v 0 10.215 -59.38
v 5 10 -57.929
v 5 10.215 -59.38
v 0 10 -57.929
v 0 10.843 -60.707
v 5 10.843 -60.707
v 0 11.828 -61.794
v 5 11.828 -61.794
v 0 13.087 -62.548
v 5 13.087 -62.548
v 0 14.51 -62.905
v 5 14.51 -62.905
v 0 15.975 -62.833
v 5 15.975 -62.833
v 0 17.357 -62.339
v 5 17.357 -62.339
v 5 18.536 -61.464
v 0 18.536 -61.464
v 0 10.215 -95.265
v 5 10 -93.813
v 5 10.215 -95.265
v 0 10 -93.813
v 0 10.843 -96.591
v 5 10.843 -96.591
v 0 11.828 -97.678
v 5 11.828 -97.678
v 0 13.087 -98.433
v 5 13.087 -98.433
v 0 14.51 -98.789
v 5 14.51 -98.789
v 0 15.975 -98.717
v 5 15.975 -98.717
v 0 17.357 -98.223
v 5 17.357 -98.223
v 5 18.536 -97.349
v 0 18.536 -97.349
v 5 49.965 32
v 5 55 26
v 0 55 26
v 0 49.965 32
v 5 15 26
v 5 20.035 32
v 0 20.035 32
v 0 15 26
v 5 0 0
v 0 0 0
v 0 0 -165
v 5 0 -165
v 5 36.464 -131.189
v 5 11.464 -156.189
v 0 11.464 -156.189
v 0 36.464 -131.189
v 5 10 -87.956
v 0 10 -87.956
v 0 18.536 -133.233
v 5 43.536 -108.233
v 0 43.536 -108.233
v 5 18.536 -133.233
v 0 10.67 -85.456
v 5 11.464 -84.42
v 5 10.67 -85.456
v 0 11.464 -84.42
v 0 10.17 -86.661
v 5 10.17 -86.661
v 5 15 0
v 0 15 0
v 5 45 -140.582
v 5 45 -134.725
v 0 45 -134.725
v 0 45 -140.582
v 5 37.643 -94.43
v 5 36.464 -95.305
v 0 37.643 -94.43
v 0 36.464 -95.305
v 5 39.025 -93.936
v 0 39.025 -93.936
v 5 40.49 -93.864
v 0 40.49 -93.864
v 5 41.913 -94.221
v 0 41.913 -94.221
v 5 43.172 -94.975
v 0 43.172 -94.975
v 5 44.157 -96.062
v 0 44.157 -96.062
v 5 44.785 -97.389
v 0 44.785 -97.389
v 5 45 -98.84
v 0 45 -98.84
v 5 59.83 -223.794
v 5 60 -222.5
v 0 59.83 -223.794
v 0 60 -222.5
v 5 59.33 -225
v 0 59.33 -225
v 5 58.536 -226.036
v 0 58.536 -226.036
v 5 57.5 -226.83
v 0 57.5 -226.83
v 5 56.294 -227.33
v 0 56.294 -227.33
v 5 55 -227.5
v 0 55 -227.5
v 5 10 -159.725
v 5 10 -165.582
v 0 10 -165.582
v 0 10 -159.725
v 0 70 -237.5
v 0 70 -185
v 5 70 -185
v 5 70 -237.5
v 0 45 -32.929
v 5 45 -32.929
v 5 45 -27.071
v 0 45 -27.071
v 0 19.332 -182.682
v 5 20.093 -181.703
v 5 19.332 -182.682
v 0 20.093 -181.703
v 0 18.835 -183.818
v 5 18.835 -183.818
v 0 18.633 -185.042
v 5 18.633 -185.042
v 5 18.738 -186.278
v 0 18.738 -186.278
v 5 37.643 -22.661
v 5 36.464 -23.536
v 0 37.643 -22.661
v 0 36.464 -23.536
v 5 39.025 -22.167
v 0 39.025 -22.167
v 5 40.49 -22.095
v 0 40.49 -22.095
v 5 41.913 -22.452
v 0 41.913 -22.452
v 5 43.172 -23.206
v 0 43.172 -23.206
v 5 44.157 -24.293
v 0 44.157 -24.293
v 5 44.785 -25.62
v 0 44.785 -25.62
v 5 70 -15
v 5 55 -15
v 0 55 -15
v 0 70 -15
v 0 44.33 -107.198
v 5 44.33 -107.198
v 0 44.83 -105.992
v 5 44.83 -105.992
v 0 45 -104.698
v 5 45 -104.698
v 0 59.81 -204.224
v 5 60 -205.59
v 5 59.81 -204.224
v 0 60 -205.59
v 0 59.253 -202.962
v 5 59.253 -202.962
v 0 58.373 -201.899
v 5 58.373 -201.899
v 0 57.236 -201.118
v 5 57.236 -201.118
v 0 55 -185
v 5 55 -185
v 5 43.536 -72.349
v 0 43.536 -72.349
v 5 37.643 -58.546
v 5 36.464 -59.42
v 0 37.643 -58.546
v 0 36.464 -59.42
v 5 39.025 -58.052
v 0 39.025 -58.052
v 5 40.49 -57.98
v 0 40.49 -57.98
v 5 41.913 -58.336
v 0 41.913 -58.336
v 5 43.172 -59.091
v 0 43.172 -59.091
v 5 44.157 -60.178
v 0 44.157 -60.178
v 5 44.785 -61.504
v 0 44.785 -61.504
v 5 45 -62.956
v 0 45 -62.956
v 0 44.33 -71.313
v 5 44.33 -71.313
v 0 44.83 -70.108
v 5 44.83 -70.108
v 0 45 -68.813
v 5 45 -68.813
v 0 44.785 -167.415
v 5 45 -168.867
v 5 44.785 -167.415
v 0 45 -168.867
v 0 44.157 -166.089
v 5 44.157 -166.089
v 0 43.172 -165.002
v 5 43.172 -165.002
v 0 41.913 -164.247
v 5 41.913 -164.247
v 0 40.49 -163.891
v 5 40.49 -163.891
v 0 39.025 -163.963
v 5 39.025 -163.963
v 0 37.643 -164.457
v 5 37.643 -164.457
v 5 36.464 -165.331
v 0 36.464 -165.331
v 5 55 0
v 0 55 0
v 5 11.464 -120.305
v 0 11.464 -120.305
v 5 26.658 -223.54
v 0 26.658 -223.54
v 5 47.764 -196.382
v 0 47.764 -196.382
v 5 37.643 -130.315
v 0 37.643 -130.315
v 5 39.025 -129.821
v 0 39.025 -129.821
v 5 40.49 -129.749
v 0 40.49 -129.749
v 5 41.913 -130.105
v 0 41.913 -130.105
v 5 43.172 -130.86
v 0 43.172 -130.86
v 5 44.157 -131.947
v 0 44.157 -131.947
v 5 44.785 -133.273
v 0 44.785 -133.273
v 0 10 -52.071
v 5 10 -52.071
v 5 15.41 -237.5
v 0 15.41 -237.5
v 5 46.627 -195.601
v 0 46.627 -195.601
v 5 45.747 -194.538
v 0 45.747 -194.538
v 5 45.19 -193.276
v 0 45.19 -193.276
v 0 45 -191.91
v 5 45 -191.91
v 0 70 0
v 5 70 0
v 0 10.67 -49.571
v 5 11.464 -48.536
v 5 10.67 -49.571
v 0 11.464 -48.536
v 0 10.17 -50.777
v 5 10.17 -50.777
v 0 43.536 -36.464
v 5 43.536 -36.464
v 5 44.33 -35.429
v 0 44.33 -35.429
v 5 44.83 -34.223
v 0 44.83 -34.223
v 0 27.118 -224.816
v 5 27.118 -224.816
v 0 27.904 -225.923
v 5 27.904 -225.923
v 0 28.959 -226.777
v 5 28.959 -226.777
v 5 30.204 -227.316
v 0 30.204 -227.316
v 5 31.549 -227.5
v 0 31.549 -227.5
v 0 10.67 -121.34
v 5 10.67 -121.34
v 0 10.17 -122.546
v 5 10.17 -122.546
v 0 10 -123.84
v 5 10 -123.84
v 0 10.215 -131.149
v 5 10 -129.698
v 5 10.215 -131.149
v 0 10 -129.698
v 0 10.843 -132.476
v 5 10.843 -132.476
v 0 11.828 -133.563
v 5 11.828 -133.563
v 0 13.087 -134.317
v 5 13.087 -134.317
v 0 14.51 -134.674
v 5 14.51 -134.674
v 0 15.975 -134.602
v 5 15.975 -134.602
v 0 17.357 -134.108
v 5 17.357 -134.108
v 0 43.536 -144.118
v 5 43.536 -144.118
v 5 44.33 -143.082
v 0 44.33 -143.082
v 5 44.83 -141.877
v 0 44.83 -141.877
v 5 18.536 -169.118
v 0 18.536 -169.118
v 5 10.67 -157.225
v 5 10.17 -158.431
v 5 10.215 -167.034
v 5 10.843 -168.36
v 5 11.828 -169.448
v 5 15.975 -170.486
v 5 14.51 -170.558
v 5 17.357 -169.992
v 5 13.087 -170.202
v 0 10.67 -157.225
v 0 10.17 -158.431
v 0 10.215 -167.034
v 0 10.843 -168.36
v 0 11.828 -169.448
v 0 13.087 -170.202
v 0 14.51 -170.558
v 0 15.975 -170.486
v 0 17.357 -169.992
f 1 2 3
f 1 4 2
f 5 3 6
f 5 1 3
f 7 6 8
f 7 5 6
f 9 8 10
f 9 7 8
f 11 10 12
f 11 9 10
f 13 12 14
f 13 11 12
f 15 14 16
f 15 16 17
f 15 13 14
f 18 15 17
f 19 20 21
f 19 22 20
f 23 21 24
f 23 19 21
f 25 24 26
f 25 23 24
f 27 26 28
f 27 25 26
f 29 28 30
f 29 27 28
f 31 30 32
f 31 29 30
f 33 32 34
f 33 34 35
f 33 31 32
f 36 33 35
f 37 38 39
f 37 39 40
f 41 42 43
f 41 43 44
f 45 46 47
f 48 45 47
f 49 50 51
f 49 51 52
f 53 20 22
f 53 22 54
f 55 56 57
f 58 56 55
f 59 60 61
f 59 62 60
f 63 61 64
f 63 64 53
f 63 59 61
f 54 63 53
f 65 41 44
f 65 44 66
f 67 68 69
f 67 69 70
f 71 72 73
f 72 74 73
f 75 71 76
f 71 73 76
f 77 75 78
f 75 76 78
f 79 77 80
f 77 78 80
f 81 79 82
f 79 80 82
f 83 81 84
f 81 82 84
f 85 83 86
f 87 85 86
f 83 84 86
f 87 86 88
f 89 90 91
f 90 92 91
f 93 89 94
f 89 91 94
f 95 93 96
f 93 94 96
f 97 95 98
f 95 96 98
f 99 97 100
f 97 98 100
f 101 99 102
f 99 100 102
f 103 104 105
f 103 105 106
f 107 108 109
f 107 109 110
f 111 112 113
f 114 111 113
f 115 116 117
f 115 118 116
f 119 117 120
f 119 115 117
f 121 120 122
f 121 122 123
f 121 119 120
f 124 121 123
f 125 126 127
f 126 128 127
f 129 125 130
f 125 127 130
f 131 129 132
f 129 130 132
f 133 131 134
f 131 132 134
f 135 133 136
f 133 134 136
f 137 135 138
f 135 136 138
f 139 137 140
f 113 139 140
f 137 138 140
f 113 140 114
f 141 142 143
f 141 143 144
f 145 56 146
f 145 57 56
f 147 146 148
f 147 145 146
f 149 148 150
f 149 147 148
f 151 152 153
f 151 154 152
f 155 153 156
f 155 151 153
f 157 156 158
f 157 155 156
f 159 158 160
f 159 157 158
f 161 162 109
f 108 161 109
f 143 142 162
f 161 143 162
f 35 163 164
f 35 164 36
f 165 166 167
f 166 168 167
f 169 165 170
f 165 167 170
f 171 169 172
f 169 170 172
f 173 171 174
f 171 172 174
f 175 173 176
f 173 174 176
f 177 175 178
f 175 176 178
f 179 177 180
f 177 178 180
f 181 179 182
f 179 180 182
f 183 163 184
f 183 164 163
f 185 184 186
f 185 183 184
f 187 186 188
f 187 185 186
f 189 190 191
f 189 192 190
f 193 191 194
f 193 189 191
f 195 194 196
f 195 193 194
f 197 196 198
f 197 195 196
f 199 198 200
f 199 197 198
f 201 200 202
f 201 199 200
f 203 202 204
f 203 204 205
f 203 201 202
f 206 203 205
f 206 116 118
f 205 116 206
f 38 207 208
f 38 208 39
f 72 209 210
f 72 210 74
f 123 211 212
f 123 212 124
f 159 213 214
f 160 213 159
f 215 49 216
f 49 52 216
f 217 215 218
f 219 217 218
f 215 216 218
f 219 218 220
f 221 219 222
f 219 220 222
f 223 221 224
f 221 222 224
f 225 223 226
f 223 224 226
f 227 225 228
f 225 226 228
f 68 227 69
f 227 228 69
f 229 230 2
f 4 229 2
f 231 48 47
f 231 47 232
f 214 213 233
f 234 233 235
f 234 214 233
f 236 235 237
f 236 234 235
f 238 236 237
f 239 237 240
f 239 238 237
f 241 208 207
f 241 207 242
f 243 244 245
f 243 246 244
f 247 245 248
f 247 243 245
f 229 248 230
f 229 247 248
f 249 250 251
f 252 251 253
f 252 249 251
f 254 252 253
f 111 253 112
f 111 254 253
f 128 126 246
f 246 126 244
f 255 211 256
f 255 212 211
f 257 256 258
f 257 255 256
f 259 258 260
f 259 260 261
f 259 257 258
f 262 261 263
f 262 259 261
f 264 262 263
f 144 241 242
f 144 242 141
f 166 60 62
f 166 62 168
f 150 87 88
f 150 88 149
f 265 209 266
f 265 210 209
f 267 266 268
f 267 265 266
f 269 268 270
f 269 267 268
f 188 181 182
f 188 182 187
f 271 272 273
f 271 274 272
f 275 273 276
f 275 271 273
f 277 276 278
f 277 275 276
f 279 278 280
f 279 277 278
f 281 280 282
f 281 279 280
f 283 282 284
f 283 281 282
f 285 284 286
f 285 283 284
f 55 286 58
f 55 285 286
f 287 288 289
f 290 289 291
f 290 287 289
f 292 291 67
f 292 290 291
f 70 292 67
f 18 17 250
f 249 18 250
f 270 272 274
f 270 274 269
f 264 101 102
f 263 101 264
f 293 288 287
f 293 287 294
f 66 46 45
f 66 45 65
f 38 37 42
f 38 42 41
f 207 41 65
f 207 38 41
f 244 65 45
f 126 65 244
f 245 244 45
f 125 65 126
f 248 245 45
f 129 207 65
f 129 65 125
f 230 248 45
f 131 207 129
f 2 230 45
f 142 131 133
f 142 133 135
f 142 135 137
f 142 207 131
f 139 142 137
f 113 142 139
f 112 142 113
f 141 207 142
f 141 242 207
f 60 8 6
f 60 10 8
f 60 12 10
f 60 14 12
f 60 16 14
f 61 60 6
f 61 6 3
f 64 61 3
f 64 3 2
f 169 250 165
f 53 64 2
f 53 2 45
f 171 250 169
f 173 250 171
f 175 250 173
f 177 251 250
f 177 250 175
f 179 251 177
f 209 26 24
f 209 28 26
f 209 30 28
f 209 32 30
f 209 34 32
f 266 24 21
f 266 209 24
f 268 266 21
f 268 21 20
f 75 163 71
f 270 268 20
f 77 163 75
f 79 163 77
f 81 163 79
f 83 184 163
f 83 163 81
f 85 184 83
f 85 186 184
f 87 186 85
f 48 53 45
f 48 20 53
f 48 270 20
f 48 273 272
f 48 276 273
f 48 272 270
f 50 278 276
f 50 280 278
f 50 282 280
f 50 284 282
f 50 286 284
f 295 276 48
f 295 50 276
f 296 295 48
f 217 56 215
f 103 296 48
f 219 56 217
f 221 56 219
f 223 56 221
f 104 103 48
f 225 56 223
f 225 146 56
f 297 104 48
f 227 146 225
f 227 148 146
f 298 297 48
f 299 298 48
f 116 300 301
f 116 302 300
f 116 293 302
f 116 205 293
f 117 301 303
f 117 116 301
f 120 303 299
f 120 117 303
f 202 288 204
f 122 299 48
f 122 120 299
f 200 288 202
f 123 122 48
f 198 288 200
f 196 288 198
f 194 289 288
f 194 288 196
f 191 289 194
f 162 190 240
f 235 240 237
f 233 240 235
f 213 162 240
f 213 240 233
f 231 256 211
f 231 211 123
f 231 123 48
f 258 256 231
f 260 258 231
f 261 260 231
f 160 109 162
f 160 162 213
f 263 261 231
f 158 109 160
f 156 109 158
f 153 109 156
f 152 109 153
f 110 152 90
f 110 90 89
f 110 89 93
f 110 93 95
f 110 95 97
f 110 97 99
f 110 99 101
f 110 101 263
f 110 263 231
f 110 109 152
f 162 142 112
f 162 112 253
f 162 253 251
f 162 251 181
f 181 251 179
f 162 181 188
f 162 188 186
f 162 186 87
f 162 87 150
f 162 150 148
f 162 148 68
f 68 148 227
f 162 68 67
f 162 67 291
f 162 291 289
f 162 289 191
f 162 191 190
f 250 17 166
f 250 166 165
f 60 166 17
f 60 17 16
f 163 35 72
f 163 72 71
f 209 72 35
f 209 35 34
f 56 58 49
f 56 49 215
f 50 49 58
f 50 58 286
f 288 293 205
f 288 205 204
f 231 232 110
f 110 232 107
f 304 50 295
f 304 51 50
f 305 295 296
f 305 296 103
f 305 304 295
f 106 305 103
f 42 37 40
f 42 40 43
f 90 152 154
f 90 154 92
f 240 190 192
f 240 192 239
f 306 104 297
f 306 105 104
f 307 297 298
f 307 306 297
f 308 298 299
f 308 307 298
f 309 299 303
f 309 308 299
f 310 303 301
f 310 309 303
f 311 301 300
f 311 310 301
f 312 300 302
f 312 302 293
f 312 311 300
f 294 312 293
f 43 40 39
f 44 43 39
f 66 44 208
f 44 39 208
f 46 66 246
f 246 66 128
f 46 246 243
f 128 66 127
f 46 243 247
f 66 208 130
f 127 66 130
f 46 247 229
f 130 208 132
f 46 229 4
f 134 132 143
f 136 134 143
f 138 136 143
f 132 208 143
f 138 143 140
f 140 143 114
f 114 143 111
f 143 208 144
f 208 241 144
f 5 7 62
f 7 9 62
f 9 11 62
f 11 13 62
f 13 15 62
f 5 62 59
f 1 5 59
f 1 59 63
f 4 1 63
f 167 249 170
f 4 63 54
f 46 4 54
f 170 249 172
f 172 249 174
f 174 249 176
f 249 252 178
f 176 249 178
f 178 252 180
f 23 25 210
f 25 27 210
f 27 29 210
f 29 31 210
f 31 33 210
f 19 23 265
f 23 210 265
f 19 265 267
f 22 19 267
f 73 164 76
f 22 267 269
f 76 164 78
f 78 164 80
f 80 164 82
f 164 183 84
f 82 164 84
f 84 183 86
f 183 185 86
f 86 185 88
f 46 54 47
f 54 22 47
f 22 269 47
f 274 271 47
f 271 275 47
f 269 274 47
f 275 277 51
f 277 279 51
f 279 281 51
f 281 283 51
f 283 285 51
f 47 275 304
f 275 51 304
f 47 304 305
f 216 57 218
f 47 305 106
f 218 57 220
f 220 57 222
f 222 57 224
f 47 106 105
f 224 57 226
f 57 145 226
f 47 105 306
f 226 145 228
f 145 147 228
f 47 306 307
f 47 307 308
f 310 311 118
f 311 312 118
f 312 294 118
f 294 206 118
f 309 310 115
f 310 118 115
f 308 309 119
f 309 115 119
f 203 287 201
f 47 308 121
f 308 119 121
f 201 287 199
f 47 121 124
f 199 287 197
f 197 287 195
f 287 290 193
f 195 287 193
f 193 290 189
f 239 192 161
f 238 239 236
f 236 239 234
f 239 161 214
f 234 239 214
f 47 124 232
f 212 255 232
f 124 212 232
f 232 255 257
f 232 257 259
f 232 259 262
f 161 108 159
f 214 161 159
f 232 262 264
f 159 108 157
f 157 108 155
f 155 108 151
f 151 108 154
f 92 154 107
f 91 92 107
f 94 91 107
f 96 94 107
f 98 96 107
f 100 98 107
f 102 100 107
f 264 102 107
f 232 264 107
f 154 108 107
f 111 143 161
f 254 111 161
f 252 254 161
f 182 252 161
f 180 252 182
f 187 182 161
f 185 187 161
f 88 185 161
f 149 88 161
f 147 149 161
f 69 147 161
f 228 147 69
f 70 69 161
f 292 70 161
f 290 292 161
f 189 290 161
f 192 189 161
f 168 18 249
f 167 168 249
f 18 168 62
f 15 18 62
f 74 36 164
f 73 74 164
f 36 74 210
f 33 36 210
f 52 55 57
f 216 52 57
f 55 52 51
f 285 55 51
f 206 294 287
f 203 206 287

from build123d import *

# Parameters (mm, degrees)
SKIZZE1_W                       = 237.5
SKIZZE1_H                       = 70
AUFSATZ_LINEAR_AUSTRAGEN1_DEPTH = 5
SCHNITT_LINEAR_AUSTRAGEN1_DEPTH = 248.651468802
SKIZZE3_W                       = 170
SKIZZE3_H                       = 15
SCHNITT_LINEAR_AUSTRAGEN2_DEPTH = 5
SCHNITT_LINEAR_AUSTRAGEN3_DEPTH = 248.651468802
VERRUNDUNG1_R                   = 5
LASCHENASE_DEPTH                = 5


with BuildPart() as part:
    # Skizze1 → Aufsatz-Linear austragen1 (new body)
    with BuildSketch(Plane(origin=(0, 0, 0), x_dir=(0, 0, -1), z_dir=(1, 0, 0))):
        with Locations((118.75, 35)):
            Rectangle(SKIZZE1_W, SKIZZE1_H)
    extrude(amount=AUFSATZ_LINEAR_AUSTRAGEN1_DEPTH)

    # Skizze2 → Schnitt-Linear austragen1 (cut, through all)
    with BuildSketch(Plane(origin=(5, 0, 0), x_dir=(0, 0, -1), z_dir=(1, 0, 0))):
        Polygon((165, 0), (237.5, 15.410350721), (237.5, 0), align=None)
    extrude(amount=-SCHNITT_LINEAR_AUSTRAGEN1_DEPTH, mode=Mode.SUBTRACT)

    # Skizze3 → Schnitt-Linear austragen2 (cut)
    with BuildSketch(Plane(origin=(5, 0, 0), x_dir=(0, 0, -1), z_dir=(1, 0, 0))):
        with Locations((100, 62.5)):
            Rectangle(SKIZZE3_W, SKIZZE3_H)
    extrude(amount=-SCHNITT_LINEAR_AUSTRAGEN2_DEPTH, mode=Mode.SUBTRACT)

    # Skizze4 → Schnitt-Linear austragen3 (cut, through all)
    with BuildSketch(Plane(origin=(5, 0, 0), x_dir=(0, 0, -1), z_dir=(1, 0, 0))):
        Polygon((15, 45), (50, 10), (70, 10), (35, 45), align=None)
        Polygon((50.884510848, 45), (70.884510848, 45), (105.884510848, 10), (85.884510848, 10), align=None)
        Polygon((86.769021696, 45), (106.769021696, 45), (141.769021696, 10), (121.769021696, 10), align=None)
        Polygon((122.653532545, 45), (142.653532545, 45), (177.653532545, 10), (157.653532545, 10), align=None)
        Polygon((227.5, 60), (227.5, 27.5), (183.622185543, 18.173482625), (156.795668168, 45), (195, 45), (202.5, 60), align=None)
    extrude(amount=-SCHNITT_LINEAR_AUSTRAGEN3_DEPTH, mode=Mode.SUBTRACT)

    # Verrundung1
    verrundung1_edges = [part.edges().sort_by_distance(p)[0] for p in [
        (2.5, 60, -202.5),
        (2.5, 60, -227.5),
        (2.5, 27.5, -227.5),
        (2.5, 18.173482625, -183.622185543),
        (2.5, 45, -156.795668168),
        (2.5, 45, -195),
        (2.5, 10, -85.884510848),
        (2.5, 45, -50.884510848),
        (2.5, 45, -70.884510848),
        (2.5, 10, -105.884510848),
        (2.5, 10, -157.653532545),
        (2.5, 45, -122.653532545),
        (2.5, 45, -142.653532545),
        (2.5, 10, -177.653532545),
        (2.5, 10, -121.769021696),
        (2.5, 45, -86.769021696),
        (2.5, 45, -106.769021696),
        (2.5, 10, -141.769021696),
        (2.5, 45, -15),
        (2.5, 45, -35),
        (2.5, 10, -70),
        (2.5, 10, -50),
    ]]
    fillet(verrundung1_edges, radius=VERRUNDUNG1_R)

    # Skizze5 → LascheNase (add)
    with BuildSketch(Plane(origin=(5, 0, 0), x_dir=(0, 0, -1), z_dir=(1, 0, 0))):
        Polygon((0, 55), (-26, 55), (-32, 49.965402213), (-32, 20.034597787), (-26, 15), (0, 15), align=None)
    extrude(amount=-LASCHENASE_DEPTH)


solid = part.part
